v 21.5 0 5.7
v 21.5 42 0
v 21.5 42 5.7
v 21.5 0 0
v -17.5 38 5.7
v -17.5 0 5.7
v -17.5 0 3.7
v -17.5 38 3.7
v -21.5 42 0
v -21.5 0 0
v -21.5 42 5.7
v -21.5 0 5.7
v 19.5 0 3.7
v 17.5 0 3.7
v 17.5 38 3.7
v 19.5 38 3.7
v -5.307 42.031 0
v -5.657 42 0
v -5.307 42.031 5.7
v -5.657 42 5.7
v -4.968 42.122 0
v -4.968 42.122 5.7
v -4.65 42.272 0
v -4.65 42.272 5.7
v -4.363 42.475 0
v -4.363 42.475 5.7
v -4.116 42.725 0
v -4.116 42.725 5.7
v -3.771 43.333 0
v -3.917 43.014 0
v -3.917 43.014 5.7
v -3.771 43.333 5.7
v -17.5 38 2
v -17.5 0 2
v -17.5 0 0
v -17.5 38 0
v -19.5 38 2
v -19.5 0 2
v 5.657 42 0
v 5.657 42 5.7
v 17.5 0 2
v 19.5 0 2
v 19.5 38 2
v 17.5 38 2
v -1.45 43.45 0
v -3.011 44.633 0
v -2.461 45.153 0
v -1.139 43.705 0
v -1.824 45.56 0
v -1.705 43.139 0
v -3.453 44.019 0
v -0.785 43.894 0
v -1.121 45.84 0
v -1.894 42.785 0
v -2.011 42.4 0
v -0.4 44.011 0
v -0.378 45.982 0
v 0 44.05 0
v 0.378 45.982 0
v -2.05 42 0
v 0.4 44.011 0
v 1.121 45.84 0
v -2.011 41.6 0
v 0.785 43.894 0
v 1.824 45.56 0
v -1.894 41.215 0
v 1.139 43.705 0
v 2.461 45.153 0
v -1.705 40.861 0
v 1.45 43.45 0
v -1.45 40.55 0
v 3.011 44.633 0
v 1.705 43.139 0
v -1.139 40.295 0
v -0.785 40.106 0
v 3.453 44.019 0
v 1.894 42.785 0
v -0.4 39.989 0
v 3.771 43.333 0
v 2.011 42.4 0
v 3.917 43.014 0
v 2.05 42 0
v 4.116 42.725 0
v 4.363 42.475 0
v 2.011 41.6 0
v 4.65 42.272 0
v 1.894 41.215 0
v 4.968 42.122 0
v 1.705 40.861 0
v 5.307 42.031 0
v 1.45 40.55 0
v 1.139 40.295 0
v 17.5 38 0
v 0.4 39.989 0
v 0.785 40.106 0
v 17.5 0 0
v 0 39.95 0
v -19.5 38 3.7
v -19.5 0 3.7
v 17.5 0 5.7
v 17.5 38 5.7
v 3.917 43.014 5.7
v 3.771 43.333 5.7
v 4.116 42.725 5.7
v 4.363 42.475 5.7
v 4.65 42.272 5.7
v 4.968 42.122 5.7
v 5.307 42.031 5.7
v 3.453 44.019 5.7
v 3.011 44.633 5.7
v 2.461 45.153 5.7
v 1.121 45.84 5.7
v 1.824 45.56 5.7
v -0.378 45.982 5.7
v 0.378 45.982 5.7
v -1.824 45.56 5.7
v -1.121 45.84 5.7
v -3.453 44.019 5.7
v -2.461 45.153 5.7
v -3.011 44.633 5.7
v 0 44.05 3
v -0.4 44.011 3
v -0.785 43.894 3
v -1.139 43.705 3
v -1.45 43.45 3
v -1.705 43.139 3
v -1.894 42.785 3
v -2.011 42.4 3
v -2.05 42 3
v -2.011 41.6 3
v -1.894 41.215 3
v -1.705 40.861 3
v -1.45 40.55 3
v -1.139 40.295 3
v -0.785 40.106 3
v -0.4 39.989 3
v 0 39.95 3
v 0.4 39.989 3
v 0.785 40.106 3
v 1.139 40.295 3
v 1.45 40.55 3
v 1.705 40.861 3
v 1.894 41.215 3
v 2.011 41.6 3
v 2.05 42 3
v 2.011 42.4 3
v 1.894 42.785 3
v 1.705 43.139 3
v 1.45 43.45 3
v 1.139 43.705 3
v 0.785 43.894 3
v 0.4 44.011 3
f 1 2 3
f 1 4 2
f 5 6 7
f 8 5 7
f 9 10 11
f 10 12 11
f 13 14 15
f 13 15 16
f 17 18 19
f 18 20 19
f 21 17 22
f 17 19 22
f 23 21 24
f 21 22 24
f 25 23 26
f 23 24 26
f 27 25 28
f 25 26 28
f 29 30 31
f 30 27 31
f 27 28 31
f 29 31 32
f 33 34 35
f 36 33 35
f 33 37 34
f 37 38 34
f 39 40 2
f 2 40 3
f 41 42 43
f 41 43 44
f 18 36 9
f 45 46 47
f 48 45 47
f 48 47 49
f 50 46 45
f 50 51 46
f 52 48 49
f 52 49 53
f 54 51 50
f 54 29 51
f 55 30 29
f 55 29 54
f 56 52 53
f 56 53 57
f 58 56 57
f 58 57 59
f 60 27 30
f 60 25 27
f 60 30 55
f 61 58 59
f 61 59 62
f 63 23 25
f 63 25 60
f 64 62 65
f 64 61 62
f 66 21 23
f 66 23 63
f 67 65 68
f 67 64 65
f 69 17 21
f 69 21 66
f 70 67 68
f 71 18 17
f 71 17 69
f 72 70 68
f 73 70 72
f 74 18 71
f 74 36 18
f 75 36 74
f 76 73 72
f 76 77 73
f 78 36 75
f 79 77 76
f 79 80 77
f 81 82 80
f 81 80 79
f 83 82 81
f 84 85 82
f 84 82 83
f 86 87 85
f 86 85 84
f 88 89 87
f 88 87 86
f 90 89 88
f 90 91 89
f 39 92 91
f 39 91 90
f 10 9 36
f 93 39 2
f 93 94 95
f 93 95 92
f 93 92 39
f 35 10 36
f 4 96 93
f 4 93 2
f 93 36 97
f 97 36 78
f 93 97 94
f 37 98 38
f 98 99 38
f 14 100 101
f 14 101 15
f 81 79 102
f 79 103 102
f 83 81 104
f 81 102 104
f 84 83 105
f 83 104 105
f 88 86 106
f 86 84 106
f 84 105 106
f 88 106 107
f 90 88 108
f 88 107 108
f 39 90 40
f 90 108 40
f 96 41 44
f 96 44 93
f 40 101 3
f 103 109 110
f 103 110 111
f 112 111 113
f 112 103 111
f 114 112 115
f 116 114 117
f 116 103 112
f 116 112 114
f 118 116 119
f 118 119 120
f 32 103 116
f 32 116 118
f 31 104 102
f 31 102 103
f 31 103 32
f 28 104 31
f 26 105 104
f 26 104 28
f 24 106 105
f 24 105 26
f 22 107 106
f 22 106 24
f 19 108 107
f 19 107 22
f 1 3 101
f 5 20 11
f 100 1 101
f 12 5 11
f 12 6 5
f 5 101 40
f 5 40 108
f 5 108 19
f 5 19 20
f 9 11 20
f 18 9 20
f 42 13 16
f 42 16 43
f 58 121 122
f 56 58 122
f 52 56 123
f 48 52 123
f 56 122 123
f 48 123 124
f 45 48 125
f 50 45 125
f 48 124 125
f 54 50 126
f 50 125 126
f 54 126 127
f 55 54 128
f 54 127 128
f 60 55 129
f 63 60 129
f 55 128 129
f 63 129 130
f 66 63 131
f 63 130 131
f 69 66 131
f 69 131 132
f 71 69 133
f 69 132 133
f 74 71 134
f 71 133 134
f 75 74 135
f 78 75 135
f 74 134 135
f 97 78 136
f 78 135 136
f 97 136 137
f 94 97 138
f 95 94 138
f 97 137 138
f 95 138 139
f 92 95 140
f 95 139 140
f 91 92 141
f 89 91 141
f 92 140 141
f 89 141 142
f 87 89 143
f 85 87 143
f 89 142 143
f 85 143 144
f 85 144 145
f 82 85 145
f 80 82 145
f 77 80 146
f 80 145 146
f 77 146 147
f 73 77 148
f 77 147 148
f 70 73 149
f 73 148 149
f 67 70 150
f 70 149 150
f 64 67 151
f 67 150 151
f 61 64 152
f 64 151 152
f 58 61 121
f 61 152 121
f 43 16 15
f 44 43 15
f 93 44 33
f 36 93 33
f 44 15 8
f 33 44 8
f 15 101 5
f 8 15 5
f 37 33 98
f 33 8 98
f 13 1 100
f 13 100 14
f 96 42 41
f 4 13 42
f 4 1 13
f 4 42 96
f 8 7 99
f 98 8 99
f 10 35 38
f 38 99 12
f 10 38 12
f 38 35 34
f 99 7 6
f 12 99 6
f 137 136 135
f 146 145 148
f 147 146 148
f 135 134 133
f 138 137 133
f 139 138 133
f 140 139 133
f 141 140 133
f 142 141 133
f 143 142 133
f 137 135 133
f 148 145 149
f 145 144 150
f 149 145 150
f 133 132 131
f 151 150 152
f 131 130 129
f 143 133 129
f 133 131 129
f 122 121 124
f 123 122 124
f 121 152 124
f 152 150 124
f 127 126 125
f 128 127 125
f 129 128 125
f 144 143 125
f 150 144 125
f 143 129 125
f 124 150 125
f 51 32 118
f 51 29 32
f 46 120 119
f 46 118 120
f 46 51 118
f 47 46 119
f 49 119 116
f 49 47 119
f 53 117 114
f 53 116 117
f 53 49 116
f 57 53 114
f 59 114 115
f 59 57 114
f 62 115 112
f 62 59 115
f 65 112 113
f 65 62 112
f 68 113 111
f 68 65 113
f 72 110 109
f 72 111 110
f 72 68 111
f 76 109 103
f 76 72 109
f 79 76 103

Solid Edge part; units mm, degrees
sketch "Sketch1" plane through (0, 0, 0) normal (0, -1, 0) x (1, 0, 0)
  line L0 (17.5, 2) -> (17.5, 0)
  line L1 (17.5, 0) -> (21.5, 0)
  line L2 (21.5, 0) -> (21.5, 5.7)
  line L3 (21.5, 5.7) -> (17.5, 5.7)
  line L4 (17.5, 5.7) -> (17.5, 3.7)
  line L5 (17.5, 3.7) -> (19.5, 3.7)
  line L6 (19.5, 3.7) -> (19.5, 2)
  line L7 (19.5, 2) -> (17.5, 2)
  line L8 (-21.5, 0) -> (-21.5, 5.7)
  line L9 (-21.5, 5.7) -> (-17.5, 5.7)
  line L10 (-17.5, 5.7) -> (-17.5, 3.7)
  line L11 (-17.5, 3.7) -> (-19.5, 3.7)
  line L12 (-19.5, 3.7) -> (-19.5, 2)
  line L13 (-19.5, 2) -> (-17.5, 2)
  line L14 (-17.5, 2) -> (-17.5, 0)
  line L15 (-17.5, 0) -> (-21.5, 0)
  dimension "D1" = 19.5
  dimension "D2" = 2
  dimension "D3" = 2
  dimension "D4" = 1.7
  dimension "D5" = 4
extrude "Protrusion1" add sketch "Sketch1" against normal blind 38
sketch "Sketch2" plane through (-19.2, 19, 5.7) normal (0, 0, 1) x (0, 1, 0)
  line L0 (23, 2.3) -> (23, -40.7)
  line L1 (23, -40.7) -> (19, -40.7)
  line L2 (19, -40.7) -> (19, 2.3)
  line L3 (19, 2.3) -> (23, 2.3)
extrude "Protrusion2" add sketch "Sketch2" against normal up to surface (5.7 mm away)
sketch "Sketch3" plane through (0, 21, 0) normal (0, 0, -1) x (0, 1, 0)
  arc A0 (21, 4) -> (21, -4) centre (21, 0) cw
  line L0 (21, -4) -> (21, 4)
extrude "Protrusion3" add sketch "Sketch3" against normal up to surface (5.7 mm away)
hole "Agujero_1" at (0, 42, 0) direction (0, 0, 1) diameter 4.1 depth 3
fillet "Redondeo_1" radius 2 2 edges at (-4, 42, 2.85) (4, 42, 2.85)
